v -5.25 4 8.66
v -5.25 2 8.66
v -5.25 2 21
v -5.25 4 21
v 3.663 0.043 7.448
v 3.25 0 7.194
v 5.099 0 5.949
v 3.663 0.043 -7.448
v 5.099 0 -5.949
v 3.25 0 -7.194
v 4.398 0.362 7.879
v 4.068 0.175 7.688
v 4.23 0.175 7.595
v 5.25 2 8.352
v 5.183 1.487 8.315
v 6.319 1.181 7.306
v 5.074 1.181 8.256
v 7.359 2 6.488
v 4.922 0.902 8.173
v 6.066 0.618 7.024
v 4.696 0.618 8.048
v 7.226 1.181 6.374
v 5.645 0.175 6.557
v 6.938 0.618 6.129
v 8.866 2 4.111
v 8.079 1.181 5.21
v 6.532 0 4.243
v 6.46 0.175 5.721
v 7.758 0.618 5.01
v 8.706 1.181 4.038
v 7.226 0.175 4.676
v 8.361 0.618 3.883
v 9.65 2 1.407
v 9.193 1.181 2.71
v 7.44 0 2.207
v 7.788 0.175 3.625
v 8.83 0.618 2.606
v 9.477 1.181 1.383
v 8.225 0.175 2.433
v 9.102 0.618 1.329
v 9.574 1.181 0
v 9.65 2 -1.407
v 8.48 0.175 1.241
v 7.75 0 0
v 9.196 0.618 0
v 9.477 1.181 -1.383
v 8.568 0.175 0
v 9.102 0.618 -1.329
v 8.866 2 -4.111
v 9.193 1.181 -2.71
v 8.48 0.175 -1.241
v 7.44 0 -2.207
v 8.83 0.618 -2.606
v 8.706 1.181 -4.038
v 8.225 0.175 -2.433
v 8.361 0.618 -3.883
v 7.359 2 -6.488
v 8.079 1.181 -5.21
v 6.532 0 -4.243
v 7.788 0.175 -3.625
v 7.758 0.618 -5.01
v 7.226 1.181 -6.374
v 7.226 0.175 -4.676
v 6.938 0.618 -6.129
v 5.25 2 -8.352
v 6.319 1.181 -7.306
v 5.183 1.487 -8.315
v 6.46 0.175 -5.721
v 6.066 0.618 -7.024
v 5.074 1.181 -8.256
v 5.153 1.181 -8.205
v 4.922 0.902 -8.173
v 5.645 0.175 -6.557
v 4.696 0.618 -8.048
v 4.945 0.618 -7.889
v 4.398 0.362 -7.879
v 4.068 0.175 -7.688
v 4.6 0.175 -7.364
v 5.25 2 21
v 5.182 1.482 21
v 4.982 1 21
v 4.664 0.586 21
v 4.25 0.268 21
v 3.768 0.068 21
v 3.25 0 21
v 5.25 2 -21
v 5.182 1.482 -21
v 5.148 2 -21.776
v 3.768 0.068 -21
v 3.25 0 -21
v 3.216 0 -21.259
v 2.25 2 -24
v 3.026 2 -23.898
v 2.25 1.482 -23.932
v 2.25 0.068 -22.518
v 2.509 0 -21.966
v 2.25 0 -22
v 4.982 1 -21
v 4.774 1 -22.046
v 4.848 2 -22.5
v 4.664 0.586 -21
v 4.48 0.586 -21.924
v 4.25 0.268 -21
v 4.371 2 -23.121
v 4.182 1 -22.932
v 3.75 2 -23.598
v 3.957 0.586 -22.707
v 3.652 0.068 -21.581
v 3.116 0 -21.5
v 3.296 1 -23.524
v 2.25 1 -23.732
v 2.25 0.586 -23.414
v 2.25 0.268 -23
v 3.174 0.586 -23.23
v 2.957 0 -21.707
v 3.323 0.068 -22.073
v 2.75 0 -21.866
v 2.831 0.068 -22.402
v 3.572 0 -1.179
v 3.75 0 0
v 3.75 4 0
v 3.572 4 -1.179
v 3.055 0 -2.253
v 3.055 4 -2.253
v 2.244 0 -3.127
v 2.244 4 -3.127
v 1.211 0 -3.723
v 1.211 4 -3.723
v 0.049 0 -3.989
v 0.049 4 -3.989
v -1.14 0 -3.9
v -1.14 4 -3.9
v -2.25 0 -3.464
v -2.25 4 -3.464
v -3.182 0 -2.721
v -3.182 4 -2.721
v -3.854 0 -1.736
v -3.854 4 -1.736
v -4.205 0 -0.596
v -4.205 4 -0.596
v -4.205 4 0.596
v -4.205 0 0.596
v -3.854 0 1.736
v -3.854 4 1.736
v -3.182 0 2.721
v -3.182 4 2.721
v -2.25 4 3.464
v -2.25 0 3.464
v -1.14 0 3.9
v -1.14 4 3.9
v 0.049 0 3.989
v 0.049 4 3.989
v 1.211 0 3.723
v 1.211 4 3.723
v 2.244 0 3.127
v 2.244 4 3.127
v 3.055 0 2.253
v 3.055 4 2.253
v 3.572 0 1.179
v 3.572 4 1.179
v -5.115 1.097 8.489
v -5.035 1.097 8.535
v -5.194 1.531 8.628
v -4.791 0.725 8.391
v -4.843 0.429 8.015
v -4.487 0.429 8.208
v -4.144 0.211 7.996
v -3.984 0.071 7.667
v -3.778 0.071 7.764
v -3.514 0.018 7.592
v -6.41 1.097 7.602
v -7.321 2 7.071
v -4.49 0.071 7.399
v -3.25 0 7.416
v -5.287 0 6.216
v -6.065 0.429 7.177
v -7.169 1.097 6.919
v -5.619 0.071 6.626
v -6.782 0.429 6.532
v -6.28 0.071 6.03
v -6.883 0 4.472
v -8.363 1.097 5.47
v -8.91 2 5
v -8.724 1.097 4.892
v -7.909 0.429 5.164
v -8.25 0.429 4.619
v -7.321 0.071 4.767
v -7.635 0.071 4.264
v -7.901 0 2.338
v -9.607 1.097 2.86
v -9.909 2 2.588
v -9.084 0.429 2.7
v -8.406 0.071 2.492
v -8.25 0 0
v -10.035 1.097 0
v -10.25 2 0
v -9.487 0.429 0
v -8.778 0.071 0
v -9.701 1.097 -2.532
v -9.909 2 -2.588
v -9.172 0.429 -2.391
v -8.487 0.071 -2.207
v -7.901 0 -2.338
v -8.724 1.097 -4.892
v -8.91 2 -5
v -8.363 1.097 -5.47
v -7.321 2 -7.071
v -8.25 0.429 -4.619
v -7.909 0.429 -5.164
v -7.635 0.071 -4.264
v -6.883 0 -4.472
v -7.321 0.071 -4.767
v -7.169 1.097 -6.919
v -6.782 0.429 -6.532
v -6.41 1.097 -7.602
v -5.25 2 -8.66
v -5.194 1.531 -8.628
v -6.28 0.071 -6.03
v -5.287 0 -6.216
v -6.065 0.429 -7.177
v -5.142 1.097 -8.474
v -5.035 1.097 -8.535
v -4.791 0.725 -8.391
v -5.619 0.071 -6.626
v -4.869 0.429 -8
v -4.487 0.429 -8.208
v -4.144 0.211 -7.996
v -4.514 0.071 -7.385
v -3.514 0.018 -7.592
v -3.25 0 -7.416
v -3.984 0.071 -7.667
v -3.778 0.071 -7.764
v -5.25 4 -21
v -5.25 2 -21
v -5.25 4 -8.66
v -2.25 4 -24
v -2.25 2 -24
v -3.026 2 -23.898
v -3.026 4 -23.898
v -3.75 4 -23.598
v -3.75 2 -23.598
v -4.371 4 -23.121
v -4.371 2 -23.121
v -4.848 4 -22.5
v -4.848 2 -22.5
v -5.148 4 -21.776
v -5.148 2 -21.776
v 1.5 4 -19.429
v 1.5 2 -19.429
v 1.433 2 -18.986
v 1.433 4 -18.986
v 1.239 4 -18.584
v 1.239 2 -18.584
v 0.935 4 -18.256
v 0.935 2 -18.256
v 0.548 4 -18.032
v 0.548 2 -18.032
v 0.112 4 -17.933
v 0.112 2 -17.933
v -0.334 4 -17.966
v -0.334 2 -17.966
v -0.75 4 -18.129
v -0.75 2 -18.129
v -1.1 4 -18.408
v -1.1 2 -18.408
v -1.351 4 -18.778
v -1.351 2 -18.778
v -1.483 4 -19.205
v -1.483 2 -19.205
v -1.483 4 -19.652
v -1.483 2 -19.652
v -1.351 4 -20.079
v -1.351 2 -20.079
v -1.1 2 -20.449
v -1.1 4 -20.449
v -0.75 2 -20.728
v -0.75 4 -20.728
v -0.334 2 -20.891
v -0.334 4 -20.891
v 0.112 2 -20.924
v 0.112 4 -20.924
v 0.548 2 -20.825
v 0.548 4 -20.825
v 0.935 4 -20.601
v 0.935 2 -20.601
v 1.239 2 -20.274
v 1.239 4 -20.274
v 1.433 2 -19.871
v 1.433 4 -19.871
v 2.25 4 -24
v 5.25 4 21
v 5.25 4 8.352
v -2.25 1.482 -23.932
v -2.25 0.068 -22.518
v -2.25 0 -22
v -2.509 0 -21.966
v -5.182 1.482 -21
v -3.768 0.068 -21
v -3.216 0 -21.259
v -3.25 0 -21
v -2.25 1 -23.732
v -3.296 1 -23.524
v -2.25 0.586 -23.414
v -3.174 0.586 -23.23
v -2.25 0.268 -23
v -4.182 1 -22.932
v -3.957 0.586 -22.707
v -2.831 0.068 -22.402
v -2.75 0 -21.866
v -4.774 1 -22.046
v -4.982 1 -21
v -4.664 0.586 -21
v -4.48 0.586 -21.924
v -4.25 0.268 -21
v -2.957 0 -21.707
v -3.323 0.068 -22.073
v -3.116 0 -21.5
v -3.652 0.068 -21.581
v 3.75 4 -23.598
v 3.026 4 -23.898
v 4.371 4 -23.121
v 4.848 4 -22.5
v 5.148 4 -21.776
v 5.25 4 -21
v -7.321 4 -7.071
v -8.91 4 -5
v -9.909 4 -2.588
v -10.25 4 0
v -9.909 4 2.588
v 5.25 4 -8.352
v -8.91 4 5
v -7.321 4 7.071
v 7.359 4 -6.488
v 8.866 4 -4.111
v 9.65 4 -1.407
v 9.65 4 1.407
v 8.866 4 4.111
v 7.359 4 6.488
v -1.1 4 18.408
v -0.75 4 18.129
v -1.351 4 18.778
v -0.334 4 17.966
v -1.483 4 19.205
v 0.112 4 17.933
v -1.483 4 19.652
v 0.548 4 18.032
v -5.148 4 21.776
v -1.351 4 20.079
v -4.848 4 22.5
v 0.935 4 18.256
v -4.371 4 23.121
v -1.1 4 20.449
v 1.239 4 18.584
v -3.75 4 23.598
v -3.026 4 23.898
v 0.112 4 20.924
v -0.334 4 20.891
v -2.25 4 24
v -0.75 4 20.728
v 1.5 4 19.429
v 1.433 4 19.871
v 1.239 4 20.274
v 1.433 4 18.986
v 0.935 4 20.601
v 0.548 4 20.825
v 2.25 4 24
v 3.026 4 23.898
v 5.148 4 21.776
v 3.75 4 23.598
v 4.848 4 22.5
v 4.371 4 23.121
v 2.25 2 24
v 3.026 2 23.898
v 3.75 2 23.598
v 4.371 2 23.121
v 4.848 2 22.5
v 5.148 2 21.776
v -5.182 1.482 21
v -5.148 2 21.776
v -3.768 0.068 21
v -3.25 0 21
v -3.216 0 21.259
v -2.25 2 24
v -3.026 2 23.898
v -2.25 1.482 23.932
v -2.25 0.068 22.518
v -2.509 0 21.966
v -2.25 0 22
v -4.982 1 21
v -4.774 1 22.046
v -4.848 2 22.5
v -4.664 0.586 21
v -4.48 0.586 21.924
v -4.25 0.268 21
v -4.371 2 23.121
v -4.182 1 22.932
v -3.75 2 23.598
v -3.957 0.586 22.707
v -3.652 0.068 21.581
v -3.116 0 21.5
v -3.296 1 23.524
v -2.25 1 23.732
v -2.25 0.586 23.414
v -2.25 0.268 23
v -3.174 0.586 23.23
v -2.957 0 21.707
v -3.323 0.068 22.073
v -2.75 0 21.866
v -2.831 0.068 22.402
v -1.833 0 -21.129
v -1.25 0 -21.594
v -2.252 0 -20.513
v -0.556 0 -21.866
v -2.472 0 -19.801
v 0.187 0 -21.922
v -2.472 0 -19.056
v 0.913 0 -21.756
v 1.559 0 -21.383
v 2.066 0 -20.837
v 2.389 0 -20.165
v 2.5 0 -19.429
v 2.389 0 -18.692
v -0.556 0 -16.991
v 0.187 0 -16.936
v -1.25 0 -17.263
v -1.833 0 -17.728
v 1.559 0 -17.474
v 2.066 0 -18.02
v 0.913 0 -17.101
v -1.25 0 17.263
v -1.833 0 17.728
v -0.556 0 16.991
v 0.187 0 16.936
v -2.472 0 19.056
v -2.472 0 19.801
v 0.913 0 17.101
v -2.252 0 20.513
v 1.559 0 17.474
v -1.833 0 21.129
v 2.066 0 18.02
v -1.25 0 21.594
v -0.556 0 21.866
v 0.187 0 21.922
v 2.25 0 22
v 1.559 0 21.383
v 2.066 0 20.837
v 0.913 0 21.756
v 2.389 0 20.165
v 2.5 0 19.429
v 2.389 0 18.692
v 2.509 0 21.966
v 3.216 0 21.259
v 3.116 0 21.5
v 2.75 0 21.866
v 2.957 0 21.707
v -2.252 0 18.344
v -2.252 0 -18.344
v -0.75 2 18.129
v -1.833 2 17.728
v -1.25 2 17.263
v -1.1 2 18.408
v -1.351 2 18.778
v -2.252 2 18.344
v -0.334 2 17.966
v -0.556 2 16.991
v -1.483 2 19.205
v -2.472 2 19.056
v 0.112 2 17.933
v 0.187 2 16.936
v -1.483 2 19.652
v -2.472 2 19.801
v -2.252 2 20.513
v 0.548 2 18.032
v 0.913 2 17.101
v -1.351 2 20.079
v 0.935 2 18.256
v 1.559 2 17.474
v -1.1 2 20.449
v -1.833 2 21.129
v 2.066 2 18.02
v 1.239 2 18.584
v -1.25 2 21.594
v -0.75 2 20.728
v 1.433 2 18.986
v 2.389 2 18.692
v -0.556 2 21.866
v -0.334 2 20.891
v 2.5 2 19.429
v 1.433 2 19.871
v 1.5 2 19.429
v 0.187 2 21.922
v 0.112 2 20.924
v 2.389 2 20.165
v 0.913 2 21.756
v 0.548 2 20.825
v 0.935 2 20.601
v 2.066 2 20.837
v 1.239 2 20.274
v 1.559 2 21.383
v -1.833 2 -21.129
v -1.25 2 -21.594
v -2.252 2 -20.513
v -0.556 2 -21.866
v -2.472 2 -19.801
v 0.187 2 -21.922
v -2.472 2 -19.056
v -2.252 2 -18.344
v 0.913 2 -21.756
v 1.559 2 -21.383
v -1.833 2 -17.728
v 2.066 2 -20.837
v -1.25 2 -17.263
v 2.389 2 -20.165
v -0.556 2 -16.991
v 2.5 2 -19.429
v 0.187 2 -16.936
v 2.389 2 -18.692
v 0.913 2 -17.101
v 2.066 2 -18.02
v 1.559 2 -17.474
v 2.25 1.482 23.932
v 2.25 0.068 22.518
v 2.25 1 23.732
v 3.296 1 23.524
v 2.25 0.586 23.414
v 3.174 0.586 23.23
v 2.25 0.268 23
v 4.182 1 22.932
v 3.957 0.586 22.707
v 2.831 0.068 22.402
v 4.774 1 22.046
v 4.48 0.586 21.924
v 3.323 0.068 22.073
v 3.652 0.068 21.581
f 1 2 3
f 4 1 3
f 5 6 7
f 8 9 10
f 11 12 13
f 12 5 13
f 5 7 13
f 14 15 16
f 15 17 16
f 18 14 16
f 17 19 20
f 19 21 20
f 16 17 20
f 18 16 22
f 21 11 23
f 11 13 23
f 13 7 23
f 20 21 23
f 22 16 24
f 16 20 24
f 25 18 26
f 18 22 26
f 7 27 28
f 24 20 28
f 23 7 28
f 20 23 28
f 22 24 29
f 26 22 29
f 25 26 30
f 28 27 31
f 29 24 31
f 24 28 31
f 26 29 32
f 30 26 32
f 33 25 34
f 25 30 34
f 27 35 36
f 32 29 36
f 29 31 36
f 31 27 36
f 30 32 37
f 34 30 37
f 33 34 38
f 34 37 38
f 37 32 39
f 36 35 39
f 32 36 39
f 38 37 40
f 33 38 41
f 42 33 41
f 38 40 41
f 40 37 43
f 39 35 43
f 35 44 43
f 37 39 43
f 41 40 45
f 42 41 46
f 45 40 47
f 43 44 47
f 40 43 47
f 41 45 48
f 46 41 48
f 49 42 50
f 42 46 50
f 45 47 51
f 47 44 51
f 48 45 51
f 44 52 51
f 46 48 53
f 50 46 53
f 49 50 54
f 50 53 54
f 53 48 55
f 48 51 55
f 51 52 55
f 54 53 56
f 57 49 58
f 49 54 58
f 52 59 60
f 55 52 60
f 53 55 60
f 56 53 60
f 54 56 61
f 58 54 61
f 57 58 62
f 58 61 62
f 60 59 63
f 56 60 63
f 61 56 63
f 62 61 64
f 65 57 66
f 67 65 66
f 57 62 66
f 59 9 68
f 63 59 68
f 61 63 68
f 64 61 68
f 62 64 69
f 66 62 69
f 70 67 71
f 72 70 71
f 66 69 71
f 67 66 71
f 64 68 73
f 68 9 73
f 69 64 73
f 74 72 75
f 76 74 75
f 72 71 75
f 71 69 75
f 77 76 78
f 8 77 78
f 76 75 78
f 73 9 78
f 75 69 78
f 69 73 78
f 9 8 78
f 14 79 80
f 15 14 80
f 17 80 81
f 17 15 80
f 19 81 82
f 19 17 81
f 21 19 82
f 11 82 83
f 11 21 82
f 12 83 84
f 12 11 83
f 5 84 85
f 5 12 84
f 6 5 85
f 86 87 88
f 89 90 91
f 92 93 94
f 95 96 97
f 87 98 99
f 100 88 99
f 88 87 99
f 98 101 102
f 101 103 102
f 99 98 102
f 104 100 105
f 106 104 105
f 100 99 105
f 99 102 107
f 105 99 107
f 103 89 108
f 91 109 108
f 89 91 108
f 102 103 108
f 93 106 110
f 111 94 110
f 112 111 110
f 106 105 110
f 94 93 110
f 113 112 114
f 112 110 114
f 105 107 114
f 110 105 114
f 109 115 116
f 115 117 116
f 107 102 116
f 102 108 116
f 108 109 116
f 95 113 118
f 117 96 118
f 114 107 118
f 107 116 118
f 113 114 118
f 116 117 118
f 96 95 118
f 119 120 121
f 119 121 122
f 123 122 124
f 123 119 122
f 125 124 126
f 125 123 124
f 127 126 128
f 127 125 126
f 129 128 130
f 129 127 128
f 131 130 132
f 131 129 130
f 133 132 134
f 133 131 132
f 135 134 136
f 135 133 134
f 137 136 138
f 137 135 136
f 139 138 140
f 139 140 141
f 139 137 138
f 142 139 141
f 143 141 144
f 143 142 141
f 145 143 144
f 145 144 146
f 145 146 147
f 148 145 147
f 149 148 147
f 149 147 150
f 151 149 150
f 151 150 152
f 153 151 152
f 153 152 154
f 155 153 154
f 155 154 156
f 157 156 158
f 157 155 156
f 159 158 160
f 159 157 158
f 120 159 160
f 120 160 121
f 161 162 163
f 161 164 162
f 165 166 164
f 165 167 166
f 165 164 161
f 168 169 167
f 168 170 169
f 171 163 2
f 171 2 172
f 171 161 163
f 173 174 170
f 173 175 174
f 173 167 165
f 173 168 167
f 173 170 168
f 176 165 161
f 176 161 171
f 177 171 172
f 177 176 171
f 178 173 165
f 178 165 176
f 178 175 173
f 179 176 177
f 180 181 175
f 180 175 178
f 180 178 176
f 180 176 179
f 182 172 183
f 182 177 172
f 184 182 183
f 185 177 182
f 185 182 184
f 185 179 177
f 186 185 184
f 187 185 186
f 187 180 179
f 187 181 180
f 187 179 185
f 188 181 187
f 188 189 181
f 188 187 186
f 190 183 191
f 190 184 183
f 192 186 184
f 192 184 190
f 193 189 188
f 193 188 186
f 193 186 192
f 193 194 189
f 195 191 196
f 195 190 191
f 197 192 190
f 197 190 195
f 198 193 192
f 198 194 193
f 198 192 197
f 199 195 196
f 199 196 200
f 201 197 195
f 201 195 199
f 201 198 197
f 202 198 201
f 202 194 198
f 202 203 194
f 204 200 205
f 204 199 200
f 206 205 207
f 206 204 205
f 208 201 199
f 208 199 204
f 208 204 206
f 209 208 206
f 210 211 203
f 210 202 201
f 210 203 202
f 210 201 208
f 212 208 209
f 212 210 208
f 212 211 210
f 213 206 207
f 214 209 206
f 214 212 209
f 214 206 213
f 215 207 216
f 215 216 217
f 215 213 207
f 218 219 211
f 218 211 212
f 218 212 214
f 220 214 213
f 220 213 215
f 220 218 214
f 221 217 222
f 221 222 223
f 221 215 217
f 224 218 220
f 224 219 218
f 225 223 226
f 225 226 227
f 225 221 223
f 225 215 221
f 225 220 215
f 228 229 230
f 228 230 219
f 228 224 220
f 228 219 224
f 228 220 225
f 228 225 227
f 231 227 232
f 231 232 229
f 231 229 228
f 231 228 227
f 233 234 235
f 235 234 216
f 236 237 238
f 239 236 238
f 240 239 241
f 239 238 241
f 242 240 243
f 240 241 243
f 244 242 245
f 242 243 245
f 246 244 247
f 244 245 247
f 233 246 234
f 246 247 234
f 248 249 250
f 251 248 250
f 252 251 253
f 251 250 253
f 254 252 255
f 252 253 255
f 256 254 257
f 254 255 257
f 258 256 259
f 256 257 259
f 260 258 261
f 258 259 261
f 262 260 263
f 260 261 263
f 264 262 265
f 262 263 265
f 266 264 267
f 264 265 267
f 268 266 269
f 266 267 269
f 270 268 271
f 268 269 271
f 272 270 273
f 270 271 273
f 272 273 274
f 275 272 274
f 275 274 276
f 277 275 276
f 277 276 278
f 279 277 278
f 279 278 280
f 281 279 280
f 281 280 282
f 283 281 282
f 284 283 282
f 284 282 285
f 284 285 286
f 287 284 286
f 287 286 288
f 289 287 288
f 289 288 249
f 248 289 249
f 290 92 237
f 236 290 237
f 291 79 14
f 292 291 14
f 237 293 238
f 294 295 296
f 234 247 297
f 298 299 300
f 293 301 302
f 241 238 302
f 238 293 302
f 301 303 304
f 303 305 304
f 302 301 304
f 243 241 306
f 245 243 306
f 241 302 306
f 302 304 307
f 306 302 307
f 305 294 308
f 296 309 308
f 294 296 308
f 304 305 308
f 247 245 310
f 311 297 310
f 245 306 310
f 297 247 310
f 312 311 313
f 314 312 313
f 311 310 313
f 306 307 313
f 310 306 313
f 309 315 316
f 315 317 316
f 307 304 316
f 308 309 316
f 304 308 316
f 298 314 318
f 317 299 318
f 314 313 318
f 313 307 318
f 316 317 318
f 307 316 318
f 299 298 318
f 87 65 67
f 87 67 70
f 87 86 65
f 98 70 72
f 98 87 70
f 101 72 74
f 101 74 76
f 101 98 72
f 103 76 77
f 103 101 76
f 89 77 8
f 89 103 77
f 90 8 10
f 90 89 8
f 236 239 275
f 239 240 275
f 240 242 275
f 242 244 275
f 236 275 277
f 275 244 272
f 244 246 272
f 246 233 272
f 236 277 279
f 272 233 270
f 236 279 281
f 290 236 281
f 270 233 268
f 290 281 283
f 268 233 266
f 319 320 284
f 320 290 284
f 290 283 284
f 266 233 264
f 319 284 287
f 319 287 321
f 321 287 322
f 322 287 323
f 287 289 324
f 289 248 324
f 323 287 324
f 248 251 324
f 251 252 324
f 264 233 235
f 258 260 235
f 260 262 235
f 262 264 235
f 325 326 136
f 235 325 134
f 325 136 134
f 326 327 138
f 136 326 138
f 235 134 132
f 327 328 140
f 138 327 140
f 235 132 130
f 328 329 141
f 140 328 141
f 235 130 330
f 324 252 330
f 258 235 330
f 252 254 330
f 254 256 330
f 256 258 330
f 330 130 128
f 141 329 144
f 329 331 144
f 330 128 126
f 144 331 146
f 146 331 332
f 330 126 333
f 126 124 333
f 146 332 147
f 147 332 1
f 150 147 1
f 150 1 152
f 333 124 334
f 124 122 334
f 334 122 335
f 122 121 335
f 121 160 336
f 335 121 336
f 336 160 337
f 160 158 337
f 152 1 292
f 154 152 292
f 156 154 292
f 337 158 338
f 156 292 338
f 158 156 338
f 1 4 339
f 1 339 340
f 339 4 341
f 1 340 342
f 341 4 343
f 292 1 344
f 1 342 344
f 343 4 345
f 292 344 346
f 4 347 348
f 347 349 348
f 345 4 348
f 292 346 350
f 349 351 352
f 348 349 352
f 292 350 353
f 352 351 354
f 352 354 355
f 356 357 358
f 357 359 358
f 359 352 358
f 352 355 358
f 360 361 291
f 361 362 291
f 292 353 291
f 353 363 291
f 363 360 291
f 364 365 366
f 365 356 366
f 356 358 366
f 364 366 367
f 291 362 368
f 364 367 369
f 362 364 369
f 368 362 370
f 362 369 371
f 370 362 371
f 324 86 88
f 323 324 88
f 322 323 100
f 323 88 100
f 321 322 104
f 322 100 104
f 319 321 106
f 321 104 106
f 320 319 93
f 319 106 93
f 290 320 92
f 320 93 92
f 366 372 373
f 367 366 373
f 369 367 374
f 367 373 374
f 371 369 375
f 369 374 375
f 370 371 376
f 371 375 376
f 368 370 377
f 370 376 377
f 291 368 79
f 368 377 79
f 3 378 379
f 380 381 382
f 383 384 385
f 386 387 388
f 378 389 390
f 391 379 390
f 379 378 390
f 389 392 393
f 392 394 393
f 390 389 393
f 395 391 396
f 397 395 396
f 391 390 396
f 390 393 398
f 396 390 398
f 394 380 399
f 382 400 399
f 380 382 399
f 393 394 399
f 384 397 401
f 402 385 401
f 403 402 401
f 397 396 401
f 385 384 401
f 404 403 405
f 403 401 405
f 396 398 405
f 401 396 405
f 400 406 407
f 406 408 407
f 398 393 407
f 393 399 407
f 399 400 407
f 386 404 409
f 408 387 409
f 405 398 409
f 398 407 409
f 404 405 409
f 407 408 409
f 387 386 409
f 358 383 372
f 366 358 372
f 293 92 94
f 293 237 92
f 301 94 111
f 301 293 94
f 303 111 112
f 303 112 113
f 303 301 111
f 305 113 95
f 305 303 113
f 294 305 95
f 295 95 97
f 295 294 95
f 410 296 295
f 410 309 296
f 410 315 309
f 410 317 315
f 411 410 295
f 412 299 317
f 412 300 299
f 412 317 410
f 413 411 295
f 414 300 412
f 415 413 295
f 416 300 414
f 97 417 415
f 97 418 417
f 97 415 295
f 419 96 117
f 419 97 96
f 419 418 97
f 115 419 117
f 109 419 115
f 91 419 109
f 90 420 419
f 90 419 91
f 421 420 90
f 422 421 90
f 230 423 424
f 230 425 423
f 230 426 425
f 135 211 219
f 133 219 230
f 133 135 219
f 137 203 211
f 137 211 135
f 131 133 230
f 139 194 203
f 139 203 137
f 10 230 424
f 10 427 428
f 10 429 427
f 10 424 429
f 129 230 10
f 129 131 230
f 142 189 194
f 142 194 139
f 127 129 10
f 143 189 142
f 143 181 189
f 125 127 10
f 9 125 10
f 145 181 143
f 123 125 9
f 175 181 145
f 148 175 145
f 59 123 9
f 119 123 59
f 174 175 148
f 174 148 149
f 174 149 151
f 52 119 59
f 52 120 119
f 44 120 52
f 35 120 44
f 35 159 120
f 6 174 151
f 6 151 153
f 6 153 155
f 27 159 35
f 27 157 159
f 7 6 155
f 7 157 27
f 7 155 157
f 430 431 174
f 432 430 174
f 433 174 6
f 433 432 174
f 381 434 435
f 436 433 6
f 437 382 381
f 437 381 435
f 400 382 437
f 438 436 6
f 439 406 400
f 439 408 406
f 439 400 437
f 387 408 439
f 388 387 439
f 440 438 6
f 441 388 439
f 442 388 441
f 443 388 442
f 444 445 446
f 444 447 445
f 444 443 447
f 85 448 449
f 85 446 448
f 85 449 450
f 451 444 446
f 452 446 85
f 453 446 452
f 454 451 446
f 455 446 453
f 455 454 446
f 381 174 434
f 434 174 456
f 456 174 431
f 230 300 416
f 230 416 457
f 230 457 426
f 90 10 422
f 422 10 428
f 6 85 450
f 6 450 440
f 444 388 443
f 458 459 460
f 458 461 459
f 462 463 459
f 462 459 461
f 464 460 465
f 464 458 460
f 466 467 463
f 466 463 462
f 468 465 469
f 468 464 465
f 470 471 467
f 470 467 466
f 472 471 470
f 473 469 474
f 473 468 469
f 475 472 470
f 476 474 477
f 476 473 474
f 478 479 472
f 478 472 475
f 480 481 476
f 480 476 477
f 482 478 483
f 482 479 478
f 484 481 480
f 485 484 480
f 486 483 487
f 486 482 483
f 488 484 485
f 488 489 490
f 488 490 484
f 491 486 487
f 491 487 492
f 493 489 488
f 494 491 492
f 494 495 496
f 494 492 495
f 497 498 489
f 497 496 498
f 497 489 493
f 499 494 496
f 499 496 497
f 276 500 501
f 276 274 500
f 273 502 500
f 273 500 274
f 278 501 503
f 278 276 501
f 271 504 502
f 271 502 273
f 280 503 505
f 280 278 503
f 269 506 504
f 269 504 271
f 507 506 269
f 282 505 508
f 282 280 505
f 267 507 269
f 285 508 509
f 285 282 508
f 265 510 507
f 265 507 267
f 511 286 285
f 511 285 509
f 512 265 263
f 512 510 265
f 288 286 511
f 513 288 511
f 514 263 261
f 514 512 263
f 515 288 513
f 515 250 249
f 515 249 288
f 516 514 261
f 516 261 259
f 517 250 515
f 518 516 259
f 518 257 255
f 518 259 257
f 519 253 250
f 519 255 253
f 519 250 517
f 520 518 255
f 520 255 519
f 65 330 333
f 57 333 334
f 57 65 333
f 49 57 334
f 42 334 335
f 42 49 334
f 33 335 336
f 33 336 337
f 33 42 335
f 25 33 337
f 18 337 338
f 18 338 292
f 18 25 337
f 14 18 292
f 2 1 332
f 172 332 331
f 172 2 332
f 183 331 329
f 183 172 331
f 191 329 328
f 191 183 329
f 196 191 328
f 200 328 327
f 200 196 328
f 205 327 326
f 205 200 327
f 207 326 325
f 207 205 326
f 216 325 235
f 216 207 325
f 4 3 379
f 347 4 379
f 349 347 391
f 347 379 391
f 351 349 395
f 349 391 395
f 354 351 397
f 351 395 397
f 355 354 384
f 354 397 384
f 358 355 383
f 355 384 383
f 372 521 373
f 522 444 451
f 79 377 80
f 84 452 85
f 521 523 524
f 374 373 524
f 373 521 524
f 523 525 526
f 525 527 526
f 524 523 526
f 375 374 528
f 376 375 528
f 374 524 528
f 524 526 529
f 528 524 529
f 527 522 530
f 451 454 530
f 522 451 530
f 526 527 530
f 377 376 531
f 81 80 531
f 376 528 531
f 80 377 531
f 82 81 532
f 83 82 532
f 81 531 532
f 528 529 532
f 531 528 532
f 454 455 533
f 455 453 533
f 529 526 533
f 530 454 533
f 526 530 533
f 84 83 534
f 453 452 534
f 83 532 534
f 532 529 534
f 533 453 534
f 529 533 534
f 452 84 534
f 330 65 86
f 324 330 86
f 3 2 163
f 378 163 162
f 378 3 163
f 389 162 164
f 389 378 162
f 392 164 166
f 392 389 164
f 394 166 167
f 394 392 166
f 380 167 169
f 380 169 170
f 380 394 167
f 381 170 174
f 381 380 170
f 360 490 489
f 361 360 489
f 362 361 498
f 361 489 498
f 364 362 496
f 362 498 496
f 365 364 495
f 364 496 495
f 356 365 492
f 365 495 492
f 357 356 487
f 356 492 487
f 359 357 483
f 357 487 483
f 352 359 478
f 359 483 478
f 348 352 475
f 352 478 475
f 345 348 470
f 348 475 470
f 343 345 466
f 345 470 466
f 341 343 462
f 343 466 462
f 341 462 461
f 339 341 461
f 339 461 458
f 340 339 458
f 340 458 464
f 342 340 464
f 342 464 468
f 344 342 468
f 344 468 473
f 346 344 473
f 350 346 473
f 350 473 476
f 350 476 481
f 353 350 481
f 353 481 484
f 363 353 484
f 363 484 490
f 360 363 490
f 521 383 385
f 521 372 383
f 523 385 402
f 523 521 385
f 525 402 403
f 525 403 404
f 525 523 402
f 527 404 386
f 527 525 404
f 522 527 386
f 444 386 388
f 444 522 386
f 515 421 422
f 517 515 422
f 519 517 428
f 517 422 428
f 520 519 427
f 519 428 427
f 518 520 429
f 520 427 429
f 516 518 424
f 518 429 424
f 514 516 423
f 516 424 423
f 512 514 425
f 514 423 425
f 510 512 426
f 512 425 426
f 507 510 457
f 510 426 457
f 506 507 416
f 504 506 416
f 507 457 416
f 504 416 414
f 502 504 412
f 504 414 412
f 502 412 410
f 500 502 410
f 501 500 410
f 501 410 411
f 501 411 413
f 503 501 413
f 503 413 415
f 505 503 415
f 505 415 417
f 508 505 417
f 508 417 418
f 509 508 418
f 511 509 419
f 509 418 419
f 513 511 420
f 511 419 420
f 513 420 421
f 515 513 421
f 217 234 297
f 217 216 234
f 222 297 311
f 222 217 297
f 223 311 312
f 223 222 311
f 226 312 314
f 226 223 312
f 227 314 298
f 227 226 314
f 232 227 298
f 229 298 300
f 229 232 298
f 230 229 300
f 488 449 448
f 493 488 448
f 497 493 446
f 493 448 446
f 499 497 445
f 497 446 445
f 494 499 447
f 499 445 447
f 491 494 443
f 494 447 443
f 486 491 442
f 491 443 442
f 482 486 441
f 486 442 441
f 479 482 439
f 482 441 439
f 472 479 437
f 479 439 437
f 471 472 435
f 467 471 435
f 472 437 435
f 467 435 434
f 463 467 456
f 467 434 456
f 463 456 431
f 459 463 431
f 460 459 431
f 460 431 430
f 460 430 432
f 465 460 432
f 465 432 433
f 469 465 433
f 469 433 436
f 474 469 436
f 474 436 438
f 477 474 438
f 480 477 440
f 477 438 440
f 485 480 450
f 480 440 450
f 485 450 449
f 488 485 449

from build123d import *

# Parameters (mm, degrees)
SKETCH1_R           = 4
BOSS_EXTRUDE1_DEPTH = 4
SKETCH2_R           = 1.5
CUT_EXTRUDE1_DEPTH  = 10
SKETCH3_R           = 2.5
CUT_EXTRUDE2_DEPTH  = 2
SKETCH4_R           = 10
SKETCH4_R_2         = 4
BOSS_EXTRUDE3_DEPTH = 4
FILLET1_R           = 2


with BuildPart() as part:
    # Sketch1 → Boss-Extrude1 (new body)
    with BuildSketch(Plane(origin=(0, 0, 0), x_dir=(1, 0, 0), z_dir=(0, 1, 0))):
        with BuildLine():
            Line((5.25, -21), (5.25, 21))
            ThreePointArc((5.25, 21), (4.371320344, 23.121320344), (2.25, 24))
            Line((2.25, 24), (-2.25, 24))
            ThreePointArc((-2.25, 24), (-4.371320344, 23.121320344), (-5.25, 21))
            Line((-5.25, 21), (-5.25, -21))
            ThreePointArc((-5.25, -21), (-4.371320344, -23.121320344), (-2.25, -24))
            Line((-2.25, -24), (2.25, -24))
            ThreePointArc((2.25, -24), (4.371320344, -23.121320344), (5.25, -21))
        make_face()
        with Locations((-0.25, 0)):
            Circle(SKETCH1_R, mode=Mode.SUBTRACT)
    extrude(amount=BOSS_EXTRUDE1_DEPTH)

    # Sketch2 → Cut-Extrude1 (cut)
    with BuildSketch(Plane.XZ):
        with Locations((0, 19.428521822)):
            Circle(SKETCH2_R)
        with Locations((0, -19.428521822)):
            Circle(SKETCH2_R)
    extrude(amount=-CUT_EXTRUDE1_DEPTH, mode=Mode.SUBTRACT)

    # Sketch3 → Cut-Extrude2 (cut)
    with BuildSketch(Plane.XZ):
        with Locations((0, 19.428521822)):
            Circle(SKETCH3_R)
        with Locations((0, -19.428521822)):
            Circle(SKETCH3_R)
    extrude(amount=-CUT_EXTRUDE2_DEPTH, mode=Mode.SUBTRACT)

    # Sketch4 → Boss-Extrude3 (add)
    with BuildSketch(Plane.XZ):
        with Locations((-0.25, 0)):
            Circle(SKETCH4_R)
        with Locations((-0.25, 0)):
            Circle(SKETCH4_R_2, mode=Mode.SUBTRACT)
    extrude(amount=-BOSS_EXTRUDE3_DEPTH)

    # Fillet1
    fillet1_edges = [part.edges().sort_by_distance(p)[0] for p in [
        (5.25, 0, 14.675823272),
        (4.371320344, 0, 23.121320344),
        (-5.25, 0, 14.830127019),
        (5.25, 0, -14.675823272),
        (9.75, 0, 0),
        (-10.25, 0, 0),
        (0, 0, 24),
        (-4.371320344, 0, 23.121320344),
        (-5.25, 0, -14.830127019),
        (-4.371320344, 0, -23.121320344),
        (0, 0, -24),
        (4.371320344, 0, -23.121320344),
    ]]
    fillet(fillet1_edges, radius=FILLET1_R)


solid = part.part
